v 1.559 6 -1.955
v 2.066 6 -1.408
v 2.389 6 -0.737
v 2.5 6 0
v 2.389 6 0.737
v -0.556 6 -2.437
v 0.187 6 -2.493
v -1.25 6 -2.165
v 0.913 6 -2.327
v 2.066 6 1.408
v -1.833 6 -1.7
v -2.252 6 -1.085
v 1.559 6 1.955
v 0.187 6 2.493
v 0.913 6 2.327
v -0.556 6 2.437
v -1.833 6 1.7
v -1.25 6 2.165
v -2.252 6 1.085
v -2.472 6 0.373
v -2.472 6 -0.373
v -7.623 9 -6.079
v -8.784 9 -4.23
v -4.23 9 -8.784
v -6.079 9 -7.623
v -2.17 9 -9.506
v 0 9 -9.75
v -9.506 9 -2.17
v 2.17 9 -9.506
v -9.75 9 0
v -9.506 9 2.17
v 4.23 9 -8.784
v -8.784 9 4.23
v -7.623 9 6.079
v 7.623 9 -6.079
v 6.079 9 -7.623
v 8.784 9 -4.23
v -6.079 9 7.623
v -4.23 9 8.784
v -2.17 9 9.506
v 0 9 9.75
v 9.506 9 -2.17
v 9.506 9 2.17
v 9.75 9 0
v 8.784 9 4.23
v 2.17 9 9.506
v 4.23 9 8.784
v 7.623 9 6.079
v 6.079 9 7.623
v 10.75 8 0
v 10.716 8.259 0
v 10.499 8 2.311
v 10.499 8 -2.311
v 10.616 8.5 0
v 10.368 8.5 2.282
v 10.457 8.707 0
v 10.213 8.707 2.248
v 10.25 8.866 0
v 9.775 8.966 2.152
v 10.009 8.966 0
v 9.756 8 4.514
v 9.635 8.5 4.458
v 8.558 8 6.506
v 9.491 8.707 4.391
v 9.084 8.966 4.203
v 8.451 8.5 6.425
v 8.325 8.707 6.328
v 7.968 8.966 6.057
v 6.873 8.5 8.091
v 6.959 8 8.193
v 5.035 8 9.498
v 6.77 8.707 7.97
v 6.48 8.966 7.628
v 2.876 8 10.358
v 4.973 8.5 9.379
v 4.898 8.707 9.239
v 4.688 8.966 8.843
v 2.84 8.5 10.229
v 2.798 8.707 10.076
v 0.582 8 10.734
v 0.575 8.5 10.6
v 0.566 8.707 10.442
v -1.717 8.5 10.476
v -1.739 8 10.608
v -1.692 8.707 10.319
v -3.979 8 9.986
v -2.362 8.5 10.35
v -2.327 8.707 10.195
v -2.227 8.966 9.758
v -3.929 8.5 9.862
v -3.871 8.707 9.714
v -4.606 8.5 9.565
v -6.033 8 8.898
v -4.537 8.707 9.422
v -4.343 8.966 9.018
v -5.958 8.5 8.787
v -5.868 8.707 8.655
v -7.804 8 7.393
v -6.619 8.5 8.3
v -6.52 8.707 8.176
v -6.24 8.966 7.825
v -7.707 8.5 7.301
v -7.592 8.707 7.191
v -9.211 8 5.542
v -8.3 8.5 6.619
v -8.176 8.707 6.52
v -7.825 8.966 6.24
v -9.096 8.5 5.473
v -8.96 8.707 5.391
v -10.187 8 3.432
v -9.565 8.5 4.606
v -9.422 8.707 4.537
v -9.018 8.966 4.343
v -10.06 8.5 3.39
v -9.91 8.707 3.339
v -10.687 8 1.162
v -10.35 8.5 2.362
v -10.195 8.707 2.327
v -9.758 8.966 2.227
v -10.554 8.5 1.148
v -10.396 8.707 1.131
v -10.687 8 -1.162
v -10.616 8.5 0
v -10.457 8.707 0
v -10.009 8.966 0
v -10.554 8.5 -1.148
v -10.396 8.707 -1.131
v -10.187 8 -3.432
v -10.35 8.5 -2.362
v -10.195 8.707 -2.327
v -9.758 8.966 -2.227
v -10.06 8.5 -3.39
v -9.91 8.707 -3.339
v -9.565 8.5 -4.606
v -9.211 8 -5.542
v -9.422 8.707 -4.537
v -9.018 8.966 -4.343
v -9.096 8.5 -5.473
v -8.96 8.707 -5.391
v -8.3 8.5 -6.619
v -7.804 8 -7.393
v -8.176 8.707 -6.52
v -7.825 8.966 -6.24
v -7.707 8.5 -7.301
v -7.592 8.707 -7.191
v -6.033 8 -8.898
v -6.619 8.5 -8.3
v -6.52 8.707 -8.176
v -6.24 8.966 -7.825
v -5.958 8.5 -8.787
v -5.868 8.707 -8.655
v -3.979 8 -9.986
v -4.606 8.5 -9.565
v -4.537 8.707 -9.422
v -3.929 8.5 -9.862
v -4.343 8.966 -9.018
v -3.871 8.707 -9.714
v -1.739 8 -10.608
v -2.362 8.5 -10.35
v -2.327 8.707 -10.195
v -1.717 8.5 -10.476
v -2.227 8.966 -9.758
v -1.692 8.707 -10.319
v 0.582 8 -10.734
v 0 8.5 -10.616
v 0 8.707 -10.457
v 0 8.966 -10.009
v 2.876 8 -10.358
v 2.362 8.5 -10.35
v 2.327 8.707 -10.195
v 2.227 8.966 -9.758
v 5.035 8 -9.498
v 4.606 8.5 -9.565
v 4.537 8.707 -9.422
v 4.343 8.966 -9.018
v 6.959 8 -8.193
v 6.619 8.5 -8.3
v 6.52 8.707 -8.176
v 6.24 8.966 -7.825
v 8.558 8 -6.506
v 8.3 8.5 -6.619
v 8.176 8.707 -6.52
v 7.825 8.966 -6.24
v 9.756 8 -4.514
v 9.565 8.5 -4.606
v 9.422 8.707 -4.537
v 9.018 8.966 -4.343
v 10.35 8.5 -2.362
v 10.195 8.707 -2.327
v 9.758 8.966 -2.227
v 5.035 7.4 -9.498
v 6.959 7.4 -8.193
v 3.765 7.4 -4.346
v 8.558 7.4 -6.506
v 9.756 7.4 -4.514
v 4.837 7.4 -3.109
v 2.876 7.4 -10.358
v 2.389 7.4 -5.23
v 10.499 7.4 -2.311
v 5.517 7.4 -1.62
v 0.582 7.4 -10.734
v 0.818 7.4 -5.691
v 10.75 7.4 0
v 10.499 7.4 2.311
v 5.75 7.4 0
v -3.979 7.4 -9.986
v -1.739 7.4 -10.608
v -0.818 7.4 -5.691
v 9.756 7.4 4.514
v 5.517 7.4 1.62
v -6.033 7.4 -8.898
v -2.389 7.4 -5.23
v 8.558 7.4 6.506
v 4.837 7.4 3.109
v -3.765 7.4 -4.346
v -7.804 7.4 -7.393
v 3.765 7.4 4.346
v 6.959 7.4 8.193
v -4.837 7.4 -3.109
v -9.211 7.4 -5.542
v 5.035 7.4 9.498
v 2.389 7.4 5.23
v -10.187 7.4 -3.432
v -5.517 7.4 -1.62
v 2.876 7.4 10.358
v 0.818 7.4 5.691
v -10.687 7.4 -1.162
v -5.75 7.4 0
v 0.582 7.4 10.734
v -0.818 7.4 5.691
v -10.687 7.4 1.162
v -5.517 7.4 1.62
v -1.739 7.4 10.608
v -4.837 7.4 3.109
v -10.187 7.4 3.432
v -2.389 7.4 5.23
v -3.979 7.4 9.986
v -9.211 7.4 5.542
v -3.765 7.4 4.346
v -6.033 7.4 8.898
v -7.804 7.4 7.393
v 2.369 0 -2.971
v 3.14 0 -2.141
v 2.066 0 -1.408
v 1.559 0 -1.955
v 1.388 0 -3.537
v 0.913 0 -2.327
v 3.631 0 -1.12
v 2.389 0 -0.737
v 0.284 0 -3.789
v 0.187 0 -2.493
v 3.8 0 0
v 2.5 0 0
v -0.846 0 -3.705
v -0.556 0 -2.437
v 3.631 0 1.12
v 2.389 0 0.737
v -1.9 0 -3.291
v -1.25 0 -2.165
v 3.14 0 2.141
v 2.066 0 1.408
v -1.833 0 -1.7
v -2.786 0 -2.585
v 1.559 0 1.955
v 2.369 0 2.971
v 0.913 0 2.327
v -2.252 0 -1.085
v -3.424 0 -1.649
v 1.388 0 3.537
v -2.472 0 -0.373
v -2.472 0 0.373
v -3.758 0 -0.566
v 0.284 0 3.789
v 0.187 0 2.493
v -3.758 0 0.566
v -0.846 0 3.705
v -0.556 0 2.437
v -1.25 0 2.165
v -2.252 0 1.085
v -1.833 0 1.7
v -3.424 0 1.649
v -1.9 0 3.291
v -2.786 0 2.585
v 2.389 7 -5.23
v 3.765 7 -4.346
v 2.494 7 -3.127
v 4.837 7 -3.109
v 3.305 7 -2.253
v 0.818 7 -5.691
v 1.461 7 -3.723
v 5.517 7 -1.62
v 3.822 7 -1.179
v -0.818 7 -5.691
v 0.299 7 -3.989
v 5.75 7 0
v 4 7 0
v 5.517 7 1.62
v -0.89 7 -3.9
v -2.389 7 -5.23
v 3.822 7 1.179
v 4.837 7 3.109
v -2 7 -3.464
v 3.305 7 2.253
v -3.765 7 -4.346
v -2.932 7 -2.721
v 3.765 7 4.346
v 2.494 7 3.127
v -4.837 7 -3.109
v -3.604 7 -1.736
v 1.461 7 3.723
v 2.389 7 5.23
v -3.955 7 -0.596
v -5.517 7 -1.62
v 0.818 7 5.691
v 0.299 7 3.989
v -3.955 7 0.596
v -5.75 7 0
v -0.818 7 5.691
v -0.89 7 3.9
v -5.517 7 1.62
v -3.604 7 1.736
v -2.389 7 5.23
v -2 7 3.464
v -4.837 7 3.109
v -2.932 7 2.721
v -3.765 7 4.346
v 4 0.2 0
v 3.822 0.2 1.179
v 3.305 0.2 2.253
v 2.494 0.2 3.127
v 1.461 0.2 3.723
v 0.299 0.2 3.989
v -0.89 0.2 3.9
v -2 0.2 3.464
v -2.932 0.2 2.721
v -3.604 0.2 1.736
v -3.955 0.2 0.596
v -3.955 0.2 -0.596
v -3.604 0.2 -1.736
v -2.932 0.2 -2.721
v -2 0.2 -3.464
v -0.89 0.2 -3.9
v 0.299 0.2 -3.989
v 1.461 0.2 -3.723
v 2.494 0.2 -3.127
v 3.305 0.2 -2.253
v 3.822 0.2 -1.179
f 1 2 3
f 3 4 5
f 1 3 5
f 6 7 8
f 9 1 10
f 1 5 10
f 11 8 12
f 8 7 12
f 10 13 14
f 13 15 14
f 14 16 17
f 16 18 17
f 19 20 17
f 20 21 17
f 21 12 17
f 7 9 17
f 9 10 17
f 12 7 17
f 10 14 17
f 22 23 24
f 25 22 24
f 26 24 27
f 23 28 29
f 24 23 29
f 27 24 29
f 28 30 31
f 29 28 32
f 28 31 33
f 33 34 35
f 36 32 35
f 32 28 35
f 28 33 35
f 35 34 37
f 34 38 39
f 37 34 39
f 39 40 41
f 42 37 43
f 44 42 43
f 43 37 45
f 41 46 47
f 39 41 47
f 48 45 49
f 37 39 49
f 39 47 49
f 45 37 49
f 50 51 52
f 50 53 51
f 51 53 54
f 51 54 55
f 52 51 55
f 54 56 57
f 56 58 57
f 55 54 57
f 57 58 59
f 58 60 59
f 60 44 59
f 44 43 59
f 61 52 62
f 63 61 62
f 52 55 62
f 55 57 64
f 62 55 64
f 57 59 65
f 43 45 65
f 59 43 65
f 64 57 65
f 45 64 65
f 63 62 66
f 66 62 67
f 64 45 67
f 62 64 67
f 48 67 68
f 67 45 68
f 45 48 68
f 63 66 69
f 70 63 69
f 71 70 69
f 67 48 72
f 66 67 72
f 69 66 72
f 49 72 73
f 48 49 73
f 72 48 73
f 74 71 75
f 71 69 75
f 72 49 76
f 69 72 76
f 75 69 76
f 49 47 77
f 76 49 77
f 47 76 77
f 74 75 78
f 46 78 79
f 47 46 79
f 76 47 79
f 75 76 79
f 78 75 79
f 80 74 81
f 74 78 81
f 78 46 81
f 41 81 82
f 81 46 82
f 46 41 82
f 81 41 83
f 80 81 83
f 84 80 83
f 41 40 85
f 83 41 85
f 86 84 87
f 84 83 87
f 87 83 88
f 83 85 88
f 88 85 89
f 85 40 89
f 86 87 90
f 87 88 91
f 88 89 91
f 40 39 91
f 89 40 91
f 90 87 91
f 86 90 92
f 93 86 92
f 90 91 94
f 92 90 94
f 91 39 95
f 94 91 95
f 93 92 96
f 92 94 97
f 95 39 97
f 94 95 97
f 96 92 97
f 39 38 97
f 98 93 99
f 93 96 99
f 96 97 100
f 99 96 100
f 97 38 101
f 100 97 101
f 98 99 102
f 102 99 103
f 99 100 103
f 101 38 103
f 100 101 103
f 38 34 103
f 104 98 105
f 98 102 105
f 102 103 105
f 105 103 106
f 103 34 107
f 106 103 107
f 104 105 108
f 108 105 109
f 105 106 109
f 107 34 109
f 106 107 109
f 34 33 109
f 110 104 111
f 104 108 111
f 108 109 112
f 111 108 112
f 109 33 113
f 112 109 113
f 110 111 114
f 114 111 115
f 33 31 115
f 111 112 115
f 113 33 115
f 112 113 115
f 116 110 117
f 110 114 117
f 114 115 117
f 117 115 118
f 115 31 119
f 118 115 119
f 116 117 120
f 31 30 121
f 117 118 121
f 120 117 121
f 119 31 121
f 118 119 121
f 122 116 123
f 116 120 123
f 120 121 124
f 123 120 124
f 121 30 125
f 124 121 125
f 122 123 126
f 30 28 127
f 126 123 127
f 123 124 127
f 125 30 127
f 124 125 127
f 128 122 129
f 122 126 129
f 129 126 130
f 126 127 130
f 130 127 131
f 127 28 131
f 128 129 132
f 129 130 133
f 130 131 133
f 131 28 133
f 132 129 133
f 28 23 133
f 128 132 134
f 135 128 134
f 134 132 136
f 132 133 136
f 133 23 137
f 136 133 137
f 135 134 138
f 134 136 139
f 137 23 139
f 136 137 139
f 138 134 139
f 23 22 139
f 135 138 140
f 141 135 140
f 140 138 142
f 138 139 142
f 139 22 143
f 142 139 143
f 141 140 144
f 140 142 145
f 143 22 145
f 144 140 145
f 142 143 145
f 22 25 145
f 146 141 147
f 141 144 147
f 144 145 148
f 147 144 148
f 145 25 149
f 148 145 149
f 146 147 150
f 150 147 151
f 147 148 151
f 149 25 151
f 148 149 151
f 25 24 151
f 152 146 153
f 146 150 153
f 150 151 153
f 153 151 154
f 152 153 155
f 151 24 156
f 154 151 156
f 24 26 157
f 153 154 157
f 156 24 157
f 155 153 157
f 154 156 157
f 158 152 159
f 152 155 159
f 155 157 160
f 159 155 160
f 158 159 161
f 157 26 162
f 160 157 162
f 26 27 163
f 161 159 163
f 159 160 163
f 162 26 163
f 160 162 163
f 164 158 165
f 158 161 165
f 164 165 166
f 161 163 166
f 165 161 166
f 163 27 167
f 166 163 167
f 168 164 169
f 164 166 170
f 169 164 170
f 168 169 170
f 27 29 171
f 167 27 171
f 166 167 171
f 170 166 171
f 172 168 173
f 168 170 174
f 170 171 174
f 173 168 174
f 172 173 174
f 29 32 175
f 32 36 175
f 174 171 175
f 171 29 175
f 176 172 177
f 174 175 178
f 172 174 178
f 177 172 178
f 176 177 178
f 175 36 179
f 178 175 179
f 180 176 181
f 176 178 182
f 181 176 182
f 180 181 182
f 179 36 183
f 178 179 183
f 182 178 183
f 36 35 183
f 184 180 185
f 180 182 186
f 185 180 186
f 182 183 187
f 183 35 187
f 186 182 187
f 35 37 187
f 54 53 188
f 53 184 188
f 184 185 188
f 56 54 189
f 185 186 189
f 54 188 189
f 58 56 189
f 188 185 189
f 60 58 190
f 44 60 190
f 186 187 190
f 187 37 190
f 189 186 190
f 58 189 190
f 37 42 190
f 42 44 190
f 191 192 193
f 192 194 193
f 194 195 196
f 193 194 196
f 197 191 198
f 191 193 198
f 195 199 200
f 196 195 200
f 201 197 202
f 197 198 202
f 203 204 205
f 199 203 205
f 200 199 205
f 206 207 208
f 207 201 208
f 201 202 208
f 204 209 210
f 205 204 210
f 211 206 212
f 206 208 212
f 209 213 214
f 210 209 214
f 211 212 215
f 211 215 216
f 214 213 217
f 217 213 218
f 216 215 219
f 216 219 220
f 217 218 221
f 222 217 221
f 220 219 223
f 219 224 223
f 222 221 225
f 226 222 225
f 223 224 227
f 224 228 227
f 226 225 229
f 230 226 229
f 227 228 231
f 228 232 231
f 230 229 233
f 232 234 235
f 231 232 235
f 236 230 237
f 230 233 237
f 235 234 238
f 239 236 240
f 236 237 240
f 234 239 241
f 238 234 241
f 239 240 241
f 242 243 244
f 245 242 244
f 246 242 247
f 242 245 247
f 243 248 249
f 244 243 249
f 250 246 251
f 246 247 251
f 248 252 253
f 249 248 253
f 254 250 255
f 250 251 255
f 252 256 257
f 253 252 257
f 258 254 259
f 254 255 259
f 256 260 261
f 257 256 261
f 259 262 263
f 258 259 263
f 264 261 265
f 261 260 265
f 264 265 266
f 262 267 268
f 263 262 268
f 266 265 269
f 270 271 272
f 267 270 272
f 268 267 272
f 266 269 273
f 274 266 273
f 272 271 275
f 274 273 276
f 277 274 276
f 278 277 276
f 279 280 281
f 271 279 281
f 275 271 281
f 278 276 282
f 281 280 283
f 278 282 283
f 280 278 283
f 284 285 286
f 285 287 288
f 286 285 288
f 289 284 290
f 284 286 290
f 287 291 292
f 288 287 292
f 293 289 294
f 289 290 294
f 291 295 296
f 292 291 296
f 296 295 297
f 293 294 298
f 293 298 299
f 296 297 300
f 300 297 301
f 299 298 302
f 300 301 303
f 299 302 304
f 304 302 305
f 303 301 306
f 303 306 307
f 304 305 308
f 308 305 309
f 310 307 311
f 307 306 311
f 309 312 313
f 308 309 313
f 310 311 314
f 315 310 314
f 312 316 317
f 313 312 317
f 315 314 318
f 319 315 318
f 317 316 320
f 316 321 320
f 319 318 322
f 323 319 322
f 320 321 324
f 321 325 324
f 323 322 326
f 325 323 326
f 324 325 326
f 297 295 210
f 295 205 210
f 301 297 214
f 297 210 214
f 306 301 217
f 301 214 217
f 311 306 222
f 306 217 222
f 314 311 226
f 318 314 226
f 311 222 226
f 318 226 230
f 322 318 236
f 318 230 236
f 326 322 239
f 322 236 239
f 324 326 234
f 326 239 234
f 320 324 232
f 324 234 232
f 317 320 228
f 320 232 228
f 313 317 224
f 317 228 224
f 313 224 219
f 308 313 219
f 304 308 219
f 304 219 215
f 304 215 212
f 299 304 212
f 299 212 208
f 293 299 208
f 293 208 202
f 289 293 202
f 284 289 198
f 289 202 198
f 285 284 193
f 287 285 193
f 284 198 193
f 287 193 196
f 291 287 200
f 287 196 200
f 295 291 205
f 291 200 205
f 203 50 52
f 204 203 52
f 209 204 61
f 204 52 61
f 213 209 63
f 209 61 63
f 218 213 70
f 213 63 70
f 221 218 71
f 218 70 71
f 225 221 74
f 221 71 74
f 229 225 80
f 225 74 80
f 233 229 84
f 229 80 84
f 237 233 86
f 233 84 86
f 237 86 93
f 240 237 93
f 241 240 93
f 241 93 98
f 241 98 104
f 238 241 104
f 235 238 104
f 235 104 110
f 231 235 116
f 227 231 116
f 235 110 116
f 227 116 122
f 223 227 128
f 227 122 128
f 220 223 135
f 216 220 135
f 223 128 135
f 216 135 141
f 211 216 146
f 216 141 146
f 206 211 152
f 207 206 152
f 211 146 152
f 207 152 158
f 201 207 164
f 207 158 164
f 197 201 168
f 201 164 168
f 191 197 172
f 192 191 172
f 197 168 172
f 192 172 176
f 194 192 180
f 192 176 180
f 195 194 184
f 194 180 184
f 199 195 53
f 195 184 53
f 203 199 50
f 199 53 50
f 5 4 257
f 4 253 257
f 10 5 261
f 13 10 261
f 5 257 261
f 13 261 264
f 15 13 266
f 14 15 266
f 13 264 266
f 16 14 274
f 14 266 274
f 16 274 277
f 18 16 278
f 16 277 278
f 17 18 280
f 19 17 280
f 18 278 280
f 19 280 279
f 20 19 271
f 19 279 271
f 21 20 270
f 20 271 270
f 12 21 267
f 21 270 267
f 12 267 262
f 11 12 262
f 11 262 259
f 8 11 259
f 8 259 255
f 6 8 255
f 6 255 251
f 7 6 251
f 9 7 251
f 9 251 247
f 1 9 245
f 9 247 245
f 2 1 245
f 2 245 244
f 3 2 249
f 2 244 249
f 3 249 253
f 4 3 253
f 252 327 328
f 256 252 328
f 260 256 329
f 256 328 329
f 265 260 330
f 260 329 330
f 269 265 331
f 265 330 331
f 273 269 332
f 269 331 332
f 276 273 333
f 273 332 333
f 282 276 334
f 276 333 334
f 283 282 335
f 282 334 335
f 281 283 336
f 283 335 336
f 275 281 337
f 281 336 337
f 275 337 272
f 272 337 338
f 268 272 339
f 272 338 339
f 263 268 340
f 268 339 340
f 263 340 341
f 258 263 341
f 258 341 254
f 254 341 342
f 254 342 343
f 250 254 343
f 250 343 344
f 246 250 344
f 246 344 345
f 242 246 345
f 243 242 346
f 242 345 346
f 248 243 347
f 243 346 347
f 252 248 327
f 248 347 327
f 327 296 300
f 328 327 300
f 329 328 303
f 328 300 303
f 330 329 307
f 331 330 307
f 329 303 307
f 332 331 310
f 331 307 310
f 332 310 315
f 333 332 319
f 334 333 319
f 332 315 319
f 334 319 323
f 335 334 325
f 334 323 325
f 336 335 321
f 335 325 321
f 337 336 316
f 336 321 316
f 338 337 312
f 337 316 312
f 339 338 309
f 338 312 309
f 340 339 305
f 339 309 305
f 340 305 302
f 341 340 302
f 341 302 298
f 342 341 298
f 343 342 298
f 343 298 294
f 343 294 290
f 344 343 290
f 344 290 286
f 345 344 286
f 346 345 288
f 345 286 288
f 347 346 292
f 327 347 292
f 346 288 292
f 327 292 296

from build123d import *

# Parameters (mm, degrees)
F2_SIZE = 0.2
F3_R    = 1


with BuildPart() as f1:
    # F0 (on Top) → F1 (revolve)
    with BuildSketch(Plane.XY):
        Polygon((2.5, 6), (2.5, 0), (4, 0), (4, 7), (5.75, 7), (5.75, 7.4), (10.75, 7.4), (10.75, 9), (0, 9), (0, 6), align=None)
    revolve(axis=Axis((0, 4.843669, 0), (0, -1, 0)))

    # F2
    f2_edges = [f1.edges().sort_by_distance(p)[0] for p in [
        (-4, 0, 0),
    ]]
    chamfer(f2_edges, length=F2_SIZE)

    # F3
    f3_edges = [f1.edges().sort_by_distance(p)[0] for p in [
        (-10.75, 9, 0),
    ]]
    fillet(f3_edges, radius=F3_R)


solid = f1.part
